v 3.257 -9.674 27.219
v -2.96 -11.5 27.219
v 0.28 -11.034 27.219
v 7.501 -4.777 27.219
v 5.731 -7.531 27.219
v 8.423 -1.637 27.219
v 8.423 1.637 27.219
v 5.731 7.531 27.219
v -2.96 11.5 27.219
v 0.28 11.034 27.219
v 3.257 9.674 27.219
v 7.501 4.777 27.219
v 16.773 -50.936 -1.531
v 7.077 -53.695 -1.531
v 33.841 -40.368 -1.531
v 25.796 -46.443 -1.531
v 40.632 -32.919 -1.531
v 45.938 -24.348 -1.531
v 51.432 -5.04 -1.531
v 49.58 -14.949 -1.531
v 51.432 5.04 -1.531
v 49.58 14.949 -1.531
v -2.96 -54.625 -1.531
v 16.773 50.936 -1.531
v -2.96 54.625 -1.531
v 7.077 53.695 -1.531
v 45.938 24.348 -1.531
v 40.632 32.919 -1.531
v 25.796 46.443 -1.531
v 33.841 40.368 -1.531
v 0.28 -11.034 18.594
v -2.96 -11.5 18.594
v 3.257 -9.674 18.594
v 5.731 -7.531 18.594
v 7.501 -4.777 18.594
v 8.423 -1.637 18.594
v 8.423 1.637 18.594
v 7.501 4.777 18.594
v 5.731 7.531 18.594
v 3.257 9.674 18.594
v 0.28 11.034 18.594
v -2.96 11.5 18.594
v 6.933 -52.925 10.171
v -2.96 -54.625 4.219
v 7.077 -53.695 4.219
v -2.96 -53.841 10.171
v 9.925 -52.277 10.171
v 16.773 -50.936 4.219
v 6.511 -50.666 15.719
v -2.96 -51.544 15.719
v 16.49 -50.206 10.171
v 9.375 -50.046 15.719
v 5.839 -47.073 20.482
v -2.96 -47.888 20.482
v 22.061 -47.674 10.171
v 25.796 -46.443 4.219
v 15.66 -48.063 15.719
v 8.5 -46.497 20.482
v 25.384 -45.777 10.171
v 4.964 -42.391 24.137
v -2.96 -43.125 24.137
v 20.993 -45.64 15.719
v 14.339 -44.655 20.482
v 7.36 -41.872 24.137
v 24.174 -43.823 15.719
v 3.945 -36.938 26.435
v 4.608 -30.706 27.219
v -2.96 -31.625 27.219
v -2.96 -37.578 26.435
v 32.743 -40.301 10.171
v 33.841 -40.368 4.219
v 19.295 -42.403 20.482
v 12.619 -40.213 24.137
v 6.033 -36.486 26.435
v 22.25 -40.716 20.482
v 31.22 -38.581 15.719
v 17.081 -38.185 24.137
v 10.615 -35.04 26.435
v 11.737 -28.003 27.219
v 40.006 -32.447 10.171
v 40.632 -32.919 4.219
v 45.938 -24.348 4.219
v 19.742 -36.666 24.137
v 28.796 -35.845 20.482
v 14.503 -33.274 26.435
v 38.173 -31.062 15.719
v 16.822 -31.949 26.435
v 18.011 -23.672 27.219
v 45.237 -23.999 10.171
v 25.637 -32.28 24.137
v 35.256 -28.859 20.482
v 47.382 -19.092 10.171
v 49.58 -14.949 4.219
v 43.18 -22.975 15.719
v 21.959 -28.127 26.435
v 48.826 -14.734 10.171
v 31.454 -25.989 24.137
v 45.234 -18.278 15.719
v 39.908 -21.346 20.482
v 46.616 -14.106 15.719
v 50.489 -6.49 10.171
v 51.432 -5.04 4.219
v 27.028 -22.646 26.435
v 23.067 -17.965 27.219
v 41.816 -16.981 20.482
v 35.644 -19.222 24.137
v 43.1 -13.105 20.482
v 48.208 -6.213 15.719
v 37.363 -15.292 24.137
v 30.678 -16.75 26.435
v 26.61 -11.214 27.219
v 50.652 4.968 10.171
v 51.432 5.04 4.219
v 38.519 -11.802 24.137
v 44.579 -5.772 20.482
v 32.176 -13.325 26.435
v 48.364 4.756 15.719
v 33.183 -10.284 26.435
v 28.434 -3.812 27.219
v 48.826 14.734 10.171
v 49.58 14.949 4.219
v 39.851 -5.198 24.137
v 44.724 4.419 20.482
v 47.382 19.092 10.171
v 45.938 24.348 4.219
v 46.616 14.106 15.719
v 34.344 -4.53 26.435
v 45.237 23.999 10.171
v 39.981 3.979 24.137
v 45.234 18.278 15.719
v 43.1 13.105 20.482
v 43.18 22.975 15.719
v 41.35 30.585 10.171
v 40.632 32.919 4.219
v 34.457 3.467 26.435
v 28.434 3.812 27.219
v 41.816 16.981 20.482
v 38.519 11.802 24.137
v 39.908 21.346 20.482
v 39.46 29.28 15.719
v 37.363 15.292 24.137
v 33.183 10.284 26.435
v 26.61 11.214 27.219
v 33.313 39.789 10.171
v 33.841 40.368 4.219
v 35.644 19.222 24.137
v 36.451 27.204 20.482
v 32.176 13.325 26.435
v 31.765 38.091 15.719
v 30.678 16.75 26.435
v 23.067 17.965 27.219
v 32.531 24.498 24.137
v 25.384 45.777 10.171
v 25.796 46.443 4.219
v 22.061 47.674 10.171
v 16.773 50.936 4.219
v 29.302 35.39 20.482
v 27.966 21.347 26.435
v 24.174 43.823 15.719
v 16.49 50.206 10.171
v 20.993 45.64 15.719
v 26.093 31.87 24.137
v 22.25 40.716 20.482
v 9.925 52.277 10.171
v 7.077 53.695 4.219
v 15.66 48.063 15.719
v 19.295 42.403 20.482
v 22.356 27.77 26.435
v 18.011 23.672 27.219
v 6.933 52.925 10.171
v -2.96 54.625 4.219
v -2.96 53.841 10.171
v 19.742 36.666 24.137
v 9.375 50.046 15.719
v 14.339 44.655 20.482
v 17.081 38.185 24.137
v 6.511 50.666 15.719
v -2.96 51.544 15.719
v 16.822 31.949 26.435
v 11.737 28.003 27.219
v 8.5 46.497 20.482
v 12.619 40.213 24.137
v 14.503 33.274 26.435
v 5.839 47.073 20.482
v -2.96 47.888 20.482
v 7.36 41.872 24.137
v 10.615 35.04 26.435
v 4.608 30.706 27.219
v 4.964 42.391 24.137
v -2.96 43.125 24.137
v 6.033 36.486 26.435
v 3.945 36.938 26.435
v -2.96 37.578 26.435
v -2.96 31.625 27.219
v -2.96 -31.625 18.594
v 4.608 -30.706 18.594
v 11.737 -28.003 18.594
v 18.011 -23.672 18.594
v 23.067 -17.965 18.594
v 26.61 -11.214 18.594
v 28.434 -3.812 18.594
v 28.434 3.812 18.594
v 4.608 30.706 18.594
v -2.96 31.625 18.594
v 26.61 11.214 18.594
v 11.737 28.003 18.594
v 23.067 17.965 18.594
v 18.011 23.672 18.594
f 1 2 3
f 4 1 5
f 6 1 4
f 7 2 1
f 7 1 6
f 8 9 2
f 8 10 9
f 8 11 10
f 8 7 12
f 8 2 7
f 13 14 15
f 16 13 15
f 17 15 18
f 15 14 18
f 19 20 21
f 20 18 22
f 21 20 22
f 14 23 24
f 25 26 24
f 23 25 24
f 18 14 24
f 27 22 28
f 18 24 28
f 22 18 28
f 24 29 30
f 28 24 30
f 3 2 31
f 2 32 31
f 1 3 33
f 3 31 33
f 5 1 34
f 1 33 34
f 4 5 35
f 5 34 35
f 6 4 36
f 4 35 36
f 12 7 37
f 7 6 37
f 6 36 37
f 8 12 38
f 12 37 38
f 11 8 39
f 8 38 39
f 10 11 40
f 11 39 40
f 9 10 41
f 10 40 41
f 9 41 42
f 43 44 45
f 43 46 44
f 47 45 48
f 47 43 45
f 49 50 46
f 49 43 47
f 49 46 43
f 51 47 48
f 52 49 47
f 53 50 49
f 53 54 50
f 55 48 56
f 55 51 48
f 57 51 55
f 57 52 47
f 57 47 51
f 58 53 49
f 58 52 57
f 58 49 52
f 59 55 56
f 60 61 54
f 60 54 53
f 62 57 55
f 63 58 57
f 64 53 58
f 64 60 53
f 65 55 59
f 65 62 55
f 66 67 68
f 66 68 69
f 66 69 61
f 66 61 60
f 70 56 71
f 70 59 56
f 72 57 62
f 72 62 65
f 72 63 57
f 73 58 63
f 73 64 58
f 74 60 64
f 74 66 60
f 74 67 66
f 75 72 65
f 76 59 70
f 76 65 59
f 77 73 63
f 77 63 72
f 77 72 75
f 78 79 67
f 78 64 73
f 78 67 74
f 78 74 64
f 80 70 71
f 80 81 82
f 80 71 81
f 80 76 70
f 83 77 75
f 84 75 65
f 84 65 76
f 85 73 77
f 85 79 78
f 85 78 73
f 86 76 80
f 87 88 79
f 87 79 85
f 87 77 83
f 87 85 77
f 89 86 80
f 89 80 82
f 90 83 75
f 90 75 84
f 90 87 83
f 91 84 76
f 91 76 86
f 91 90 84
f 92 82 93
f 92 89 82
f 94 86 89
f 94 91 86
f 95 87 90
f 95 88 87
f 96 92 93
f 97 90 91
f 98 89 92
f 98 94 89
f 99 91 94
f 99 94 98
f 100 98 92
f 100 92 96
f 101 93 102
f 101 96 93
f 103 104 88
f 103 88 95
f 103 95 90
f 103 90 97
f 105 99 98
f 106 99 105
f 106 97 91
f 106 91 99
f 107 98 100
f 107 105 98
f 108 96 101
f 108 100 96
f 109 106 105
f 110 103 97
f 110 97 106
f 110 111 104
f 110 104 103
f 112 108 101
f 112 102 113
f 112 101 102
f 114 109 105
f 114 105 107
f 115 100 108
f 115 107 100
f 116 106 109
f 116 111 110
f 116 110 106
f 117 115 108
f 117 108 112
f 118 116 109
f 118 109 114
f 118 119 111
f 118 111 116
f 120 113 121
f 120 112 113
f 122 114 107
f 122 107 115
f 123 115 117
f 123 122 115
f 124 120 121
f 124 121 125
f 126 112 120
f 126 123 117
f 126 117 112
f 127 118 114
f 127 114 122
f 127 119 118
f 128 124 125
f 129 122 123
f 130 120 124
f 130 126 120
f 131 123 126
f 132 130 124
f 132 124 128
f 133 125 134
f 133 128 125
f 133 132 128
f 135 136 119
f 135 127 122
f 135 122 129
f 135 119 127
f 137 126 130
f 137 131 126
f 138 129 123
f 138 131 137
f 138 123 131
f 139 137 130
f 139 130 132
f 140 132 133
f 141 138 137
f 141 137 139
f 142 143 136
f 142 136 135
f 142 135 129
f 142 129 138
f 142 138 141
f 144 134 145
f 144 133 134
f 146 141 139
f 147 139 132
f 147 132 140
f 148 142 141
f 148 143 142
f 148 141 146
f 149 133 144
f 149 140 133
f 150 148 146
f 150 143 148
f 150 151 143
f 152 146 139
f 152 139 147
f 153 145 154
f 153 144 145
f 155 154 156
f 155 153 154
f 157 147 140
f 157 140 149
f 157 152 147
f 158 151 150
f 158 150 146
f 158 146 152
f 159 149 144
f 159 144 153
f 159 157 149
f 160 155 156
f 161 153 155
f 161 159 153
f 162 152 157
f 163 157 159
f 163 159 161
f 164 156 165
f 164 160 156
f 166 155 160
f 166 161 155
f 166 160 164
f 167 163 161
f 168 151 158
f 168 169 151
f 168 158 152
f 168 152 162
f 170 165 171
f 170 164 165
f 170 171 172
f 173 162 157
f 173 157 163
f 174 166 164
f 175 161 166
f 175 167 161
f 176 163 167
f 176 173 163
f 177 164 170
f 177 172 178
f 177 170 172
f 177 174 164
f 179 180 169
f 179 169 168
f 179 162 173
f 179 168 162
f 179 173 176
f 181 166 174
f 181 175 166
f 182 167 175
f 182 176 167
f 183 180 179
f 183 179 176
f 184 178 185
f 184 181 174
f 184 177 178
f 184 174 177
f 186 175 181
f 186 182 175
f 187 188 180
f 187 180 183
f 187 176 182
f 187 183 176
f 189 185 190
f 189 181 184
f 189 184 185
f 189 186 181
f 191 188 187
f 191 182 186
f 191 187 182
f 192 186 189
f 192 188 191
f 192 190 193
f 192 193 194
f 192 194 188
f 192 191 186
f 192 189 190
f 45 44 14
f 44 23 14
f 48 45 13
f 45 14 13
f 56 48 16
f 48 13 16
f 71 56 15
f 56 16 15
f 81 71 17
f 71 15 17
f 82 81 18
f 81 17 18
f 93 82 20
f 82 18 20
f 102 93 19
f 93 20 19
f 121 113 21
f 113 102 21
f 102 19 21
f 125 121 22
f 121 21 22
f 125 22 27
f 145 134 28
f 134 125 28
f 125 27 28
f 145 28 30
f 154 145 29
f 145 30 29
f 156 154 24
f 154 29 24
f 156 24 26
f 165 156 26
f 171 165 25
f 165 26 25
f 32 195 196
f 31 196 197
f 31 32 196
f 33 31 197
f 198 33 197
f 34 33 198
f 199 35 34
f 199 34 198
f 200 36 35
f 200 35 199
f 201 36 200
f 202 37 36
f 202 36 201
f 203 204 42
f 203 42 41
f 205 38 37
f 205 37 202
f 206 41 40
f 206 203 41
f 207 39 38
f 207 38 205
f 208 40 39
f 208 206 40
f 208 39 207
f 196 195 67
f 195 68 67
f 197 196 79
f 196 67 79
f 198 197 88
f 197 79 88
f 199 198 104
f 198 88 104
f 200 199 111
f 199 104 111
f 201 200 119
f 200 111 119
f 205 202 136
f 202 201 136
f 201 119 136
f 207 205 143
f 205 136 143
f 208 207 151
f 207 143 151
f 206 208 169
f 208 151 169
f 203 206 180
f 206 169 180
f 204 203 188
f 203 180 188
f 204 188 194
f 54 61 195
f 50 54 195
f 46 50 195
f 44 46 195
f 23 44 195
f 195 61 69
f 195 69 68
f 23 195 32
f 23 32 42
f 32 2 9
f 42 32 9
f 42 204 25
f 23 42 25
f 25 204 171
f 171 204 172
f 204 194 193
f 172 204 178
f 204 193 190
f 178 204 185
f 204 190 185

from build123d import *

# Parameters (mm, degrees)
SKETCH1_R           = 47.5
BOSS_EXTRUDE2_DEPTH = 25
FILLET1_R           = 20
SKETCH3_R           = 10
BOSS_EXTRUDE3_DEPTH = 5
SKETCH4_R           = 27.5
CUT_EXTRUDE1_DEPTH  = 7.5
SKETCH5_R           = 10
BOSS_EXTRUDE5_DEPTH = 7.5
SKETCH6_W           = 48.682304138
SKETCH6_H           = 105.772137124
CUT_EXTRUDE2_DEPTH  = 50
SCALE4_SCALE        = 1.15


with BuildPart() as part:
    # Sketch1 → Boss-Extrude2 (new body)
    with BuildSketch(Plane.XY):
        Circle(SKETCH1_R)
    extrude(amount=BOSS_EXTRUDE2_DEPTH)

    # Fillet1
    fillet1_edges = [part.edges().sort_by_distance(p)[0] for p in [
        (-47.5, 0, 25),
    ]]
    fillet(fillet1_edges, radius=FILLET1_R)

    # Sketch3 → Boss-Extrude3 (add)
    with BuildSketch(Plane.XY.offset(25)):
        Circle(SKETCH3_R)
    extrude(amount=-BOSS_EXTRUDE3_DEPTH)

    # Sketch4 → Cut-Extrude1 (cut)
    with BuildSketch(Plane.XY.offset(25)):
        Circle(SKETCH4_R)
    extrude(amount=-CUT_EXTRUDE1_DEPTH, mode=Mode.SUBTRACT)

    # Sketch5 → Boss-Extrude5 (add)
    with BuildSketch(Plane.XY.offset(17.5)):
        Circle(SKETCH5_R)
    extrude(amount=BOSS_EXTRUDE5_DEPTH)

    # Sketch6 → Cut-Extrude2 (cut)
    with BuildSketch(Plane.XY.offset(25)):
        with Locations((-24.341152069, -1.830671604)):
            Rectangle(SKETCH6_W, SKETCH6_H)
    extrude(amount=-CUT_EXTRUDE2_DEPTH, mode=Mode.SUBTRACT)


with BuildPart() as part_1:
    # Scale4: scaled about (19.733587982, 0, 10.209783997)
    add(part.part.scale(SCALE4_SCALE).moved(Location((-2.960038197, 0, -1.5314676))))


solid = part_1.part
